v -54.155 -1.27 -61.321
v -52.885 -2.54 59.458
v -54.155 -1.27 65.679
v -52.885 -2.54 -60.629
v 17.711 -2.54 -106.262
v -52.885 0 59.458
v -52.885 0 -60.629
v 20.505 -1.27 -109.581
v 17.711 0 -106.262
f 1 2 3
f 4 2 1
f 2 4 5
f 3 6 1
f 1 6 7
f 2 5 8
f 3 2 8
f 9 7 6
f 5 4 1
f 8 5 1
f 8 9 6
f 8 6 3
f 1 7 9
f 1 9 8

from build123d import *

# Parameters (mm, degrees)
F1_DEPTH = 2.54
F2_SIZE  = 1.26999


# Not quite as in the source:
# - a fillet or chamfer is up to 0.001 mm smaller than in the source, because OpenCascade refuses the exact size


with BuildPart() as f1:
    # F0 (on Front) → F1 (new body)
    with BuildSketch(Plane.XZ):
        Polygon((20.5051476899, -109.5806663148), (-54.1552996701, 65.6793336852), (-54.1552996701, -61.3206663148), align=None)
    extrude(amount=F1_DEPTH)

    # F2 (size 1.27 in the source; OpenCascade refuses exactly that, so slightly less here)
    f2_edges = [f1.edges().sort_by_distance(p)[0] for p in [
        (-16.825076, -2.54, -85.450666),
        (-16.825076, -2.54, -21.950666),
        (-54.1553, -2.54, 2.179334),
        (-16.825076, 0, -85.450666),
        (-16.825076, 0, -21.950666),
        (-54.1553, 0, 2.179334),
    ]]
    chamfer(f2_edges, length=F2_SIZE)


solid = f1.part
